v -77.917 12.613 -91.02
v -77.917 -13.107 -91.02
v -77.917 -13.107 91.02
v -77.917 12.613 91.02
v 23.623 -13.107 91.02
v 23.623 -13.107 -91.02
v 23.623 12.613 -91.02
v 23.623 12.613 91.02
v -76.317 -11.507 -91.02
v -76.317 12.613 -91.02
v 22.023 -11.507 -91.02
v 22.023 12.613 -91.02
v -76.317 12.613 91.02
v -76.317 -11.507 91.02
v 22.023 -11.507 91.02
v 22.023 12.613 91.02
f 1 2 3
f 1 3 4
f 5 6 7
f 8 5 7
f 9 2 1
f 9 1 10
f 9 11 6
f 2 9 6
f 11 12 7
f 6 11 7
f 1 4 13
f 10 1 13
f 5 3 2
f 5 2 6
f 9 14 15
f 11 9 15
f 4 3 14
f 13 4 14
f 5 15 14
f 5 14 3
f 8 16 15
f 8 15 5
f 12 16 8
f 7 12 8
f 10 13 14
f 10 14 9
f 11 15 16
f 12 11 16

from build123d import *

# Parameters (mm, degrees)
CROQUIS1_W              = 101.54
CROQUIS1_H              = 25.72
CROQUIS1_W_2            = 98.34
CROQUIS1_H_2            = 22.52
SALIENTE_EXTRUIR1_DEPTH = 91.02
CROQUIS2_W              = 98.34
CROQUIS2_H              = 182.04
CORTAR_EXTRUIR1_DEPTH   = 6.04


with BuildPart() as part:
    # Croquis1 → Saliente-Extruir1 (new, symmetric)
    with BuildSketch(Plane.XY):
        with Locations((-27.147074341, -0.246714628)):
            Rectangle(CROQUIS1_W, CROQUIS1_H)
        with Locations((-27.147074341, -0.246714628)):
            Rectangle(CROQUIS1_W_2, CROQUIS1_H_2, mode=Mode.SUBTRACT)
    extrude(amount=SALIENTE_EXTRUIR1_DEPTH, both=True)

    # Croquis2 → Cortar-Extruir1 (cut)
    with BuildSketch(Plane(origin=(0, 12.613285372, 0), x_dir=(1, 0, 0), z_dir=(0, 1, 0))):
        with Locations((-27.147074341, 0)):
            Rectangle(CROQUIS2_W, CROQUIS2_H)
    extrude(amount=-CORTAR_EXTRUIR1_DEPTH, mode=Mode.SUBTRACT)


solid = part.part
